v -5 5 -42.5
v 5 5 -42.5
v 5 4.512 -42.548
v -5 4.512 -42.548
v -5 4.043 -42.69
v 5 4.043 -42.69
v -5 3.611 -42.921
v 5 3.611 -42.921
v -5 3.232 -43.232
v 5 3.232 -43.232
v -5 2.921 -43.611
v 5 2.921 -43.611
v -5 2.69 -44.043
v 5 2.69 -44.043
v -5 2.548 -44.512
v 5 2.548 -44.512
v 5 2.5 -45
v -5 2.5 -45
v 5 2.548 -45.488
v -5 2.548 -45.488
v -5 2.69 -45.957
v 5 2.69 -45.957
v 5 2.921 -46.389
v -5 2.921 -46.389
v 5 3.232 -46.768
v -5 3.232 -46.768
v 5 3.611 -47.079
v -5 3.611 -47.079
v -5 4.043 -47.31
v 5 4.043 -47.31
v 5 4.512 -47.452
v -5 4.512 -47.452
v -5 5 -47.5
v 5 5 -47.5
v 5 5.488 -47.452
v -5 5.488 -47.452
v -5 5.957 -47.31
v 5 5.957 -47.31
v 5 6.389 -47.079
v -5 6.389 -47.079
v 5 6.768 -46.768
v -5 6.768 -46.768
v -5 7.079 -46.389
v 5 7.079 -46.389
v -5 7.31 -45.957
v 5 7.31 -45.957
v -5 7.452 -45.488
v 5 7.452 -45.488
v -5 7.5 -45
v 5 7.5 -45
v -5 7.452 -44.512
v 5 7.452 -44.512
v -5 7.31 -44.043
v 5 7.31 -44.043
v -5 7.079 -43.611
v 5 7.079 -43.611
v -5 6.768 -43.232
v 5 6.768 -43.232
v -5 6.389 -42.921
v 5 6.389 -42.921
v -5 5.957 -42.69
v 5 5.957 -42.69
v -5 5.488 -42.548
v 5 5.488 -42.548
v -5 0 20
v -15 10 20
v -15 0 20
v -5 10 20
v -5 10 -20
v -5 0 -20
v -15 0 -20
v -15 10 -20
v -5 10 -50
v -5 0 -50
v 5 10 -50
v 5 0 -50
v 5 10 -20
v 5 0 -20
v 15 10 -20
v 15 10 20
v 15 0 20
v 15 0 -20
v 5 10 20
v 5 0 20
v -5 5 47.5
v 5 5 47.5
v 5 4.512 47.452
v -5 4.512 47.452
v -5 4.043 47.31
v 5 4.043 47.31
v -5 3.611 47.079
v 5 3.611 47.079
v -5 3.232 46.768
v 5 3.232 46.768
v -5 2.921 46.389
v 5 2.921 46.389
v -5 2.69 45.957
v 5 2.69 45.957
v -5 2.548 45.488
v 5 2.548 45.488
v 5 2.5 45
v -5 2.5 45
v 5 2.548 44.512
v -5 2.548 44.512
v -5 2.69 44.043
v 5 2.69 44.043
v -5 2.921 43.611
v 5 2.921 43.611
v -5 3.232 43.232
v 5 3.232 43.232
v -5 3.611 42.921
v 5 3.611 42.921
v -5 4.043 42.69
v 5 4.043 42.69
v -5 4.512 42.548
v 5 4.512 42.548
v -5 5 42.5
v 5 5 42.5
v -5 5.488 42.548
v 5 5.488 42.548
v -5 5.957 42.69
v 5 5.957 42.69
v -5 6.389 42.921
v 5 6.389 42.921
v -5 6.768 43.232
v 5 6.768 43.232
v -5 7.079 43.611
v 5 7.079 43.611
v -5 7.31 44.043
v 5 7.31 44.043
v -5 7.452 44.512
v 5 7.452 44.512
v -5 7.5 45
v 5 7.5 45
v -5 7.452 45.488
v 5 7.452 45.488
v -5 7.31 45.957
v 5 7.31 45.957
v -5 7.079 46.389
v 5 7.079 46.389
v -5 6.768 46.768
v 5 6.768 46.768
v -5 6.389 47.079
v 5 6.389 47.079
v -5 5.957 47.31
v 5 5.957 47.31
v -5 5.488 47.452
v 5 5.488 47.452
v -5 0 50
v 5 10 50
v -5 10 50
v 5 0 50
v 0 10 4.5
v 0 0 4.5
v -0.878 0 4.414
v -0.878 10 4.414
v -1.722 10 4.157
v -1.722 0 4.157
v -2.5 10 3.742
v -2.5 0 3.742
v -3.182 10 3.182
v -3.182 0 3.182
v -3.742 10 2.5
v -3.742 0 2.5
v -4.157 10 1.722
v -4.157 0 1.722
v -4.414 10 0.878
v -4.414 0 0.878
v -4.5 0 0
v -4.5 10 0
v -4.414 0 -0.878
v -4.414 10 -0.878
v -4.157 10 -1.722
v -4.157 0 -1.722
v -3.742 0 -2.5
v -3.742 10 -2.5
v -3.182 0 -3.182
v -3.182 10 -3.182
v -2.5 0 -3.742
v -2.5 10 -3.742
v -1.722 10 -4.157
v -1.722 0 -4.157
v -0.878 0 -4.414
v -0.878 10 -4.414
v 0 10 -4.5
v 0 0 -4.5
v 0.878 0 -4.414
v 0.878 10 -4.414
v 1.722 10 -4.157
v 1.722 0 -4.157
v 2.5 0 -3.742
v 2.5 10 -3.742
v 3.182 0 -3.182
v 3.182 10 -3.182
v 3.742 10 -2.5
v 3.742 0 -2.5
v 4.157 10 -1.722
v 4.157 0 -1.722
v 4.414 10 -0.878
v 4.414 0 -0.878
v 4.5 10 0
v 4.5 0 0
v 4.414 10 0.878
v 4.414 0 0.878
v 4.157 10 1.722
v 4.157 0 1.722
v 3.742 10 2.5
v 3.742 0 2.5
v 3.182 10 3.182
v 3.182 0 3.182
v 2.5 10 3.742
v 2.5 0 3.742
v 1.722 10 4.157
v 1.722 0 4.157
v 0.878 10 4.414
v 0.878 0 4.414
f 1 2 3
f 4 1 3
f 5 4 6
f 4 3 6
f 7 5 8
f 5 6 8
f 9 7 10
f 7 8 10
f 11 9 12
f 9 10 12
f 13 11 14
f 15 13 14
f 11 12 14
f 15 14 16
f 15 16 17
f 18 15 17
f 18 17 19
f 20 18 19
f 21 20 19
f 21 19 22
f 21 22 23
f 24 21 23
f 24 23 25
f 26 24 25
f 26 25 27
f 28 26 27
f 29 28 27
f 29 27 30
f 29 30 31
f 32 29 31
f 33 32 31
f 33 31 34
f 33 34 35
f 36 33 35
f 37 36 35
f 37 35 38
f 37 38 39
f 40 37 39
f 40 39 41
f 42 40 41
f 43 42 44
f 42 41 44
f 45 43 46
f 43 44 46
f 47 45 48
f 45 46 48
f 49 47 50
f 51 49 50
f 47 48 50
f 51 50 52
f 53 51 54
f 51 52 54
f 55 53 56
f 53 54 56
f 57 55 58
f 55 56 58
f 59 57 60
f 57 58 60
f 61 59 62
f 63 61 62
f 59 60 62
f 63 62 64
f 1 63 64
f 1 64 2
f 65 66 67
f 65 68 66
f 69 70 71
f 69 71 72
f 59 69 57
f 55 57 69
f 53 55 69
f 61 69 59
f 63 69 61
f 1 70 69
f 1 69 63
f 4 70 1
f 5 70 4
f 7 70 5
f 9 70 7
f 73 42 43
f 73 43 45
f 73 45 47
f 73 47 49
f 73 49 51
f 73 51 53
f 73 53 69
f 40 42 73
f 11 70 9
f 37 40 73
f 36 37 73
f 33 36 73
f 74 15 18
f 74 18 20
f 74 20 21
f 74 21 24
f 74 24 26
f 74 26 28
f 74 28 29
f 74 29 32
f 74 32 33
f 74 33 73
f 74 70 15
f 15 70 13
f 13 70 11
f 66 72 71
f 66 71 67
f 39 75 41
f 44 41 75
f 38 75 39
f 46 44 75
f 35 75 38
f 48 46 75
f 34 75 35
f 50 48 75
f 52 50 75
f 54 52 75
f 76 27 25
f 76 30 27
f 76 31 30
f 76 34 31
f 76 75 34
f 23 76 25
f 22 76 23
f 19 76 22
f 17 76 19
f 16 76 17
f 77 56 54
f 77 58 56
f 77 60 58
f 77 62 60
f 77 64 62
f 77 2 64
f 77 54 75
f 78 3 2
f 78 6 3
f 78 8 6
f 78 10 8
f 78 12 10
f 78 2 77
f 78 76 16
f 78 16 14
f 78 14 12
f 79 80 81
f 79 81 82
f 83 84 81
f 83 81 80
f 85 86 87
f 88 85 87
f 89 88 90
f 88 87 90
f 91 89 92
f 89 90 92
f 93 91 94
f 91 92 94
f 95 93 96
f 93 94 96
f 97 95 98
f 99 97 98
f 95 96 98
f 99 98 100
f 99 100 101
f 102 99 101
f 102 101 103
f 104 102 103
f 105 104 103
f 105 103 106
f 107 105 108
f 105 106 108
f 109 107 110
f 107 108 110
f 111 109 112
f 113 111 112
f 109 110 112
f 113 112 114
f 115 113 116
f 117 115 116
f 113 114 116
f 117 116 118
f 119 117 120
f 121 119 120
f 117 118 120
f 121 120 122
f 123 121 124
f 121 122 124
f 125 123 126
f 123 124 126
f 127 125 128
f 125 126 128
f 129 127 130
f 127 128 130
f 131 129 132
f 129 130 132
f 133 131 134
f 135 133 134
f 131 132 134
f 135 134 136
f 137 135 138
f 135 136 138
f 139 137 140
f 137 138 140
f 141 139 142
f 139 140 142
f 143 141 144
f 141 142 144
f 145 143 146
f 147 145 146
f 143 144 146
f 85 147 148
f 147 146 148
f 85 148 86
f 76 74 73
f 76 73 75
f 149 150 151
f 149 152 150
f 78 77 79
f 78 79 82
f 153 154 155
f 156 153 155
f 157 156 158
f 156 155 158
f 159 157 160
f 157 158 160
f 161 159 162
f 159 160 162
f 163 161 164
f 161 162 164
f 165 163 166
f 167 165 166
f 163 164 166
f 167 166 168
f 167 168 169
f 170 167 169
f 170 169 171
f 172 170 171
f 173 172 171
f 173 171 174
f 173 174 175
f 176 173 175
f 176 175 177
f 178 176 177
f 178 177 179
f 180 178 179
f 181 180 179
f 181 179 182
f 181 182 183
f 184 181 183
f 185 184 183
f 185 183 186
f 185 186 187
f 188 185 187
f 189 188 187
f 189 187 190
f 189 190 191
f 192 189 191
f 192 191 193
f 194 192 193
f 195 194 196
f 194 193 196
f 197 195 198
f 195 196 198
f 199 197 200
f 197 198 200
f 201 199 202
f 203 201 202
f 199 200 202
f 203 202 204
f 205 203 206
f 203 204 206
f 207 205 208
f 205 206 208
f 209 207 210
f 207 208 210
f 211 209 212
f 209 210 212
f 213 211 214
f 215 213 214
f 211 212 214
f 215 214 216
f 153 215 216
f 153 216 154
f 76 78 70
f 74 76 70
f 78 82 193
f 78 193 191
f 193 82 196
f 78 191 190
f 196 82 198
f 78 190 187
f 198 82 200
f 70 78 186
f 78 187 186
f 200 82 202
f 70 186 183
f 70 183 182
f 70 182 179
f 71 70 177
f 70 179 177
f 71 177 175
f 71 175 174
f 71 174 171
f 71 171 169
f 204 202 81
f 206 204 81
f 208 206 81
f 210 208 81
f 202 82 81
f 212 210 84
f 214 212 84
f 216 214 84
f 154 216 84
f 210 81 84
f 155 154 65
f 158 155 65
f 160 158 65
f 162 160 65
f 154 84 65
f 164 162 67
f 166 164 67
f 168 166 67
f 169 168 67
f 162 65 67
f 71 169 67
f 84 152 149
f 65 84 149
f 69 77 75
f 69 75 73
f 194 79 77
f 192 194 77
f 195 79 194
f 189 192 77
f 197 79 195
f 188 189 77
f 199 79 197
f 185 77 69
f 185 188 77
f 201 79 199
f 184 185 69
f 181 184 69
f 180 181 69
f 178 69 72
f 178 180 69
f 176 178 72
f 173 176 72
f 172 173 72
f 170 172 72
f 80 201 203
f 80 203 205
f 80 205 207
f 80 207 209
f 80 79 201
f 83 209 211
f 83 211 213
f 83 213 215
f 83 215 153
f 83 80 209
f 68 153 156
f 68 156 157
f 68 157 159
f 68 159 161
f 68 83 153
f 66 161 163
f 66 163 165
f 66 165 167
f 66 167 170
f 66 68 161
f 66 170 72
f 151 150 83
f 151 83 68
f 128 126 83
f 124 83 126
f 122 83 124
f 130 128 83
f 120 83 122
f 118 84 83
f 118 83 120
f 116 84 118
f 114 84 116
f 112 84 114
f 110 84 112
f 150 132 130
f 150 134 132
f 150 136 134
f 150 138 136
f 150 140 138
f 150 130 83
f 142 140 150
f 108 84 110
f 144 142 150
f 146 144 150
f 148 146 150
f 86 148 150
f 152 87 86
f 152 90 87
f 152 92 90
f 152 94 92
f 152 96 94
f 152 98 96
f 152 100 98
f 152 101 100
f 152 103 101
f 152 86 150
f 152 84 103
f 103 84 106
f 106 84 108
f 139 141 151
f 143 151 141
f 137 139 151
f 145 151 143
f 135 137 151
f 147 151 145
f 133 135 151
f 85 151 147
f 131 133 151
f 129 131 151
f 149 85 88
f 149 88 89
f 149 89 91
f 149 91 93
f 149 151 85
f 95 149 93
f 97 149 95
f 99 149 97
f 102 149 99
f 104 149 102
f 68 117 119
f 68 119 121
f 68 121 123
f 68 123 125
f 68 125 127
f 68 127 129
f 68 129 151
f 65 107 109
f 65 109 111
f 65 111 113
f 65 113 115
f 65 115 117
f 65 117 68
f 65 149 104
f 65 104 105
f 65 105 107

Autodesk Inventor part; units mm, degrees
ref_plane "YZ Plane" through (0, 0, 0) normal (1, 0, 0) x (0, 1, 0)
ref_plane "XZ Plane" through (0, 0, 0) normal (0, 1, 0) x (-1, 0, 0)
ref_plane "XY Plane" through (0, 0, 0) normal (0, 0, 1) x (1, 0, 0)
sketch "Esquisse1" plane through (0, 0, 0) normal (0, 1, 0) x (-1, 0, 0)
  line L0 (-5, 50) -> (5, 50)
  line L1 (5, 50) -> (5, -50)
  line L2 (5, -50) -> (-5, -50)
  line L3 (-5, -50) -> (-5, 50)
  line L4 (-5, 50) -> (5, -50) construction
  line L5 (5, 50) -> (-5, -50) construction
  point P0 (0, 0)
  dimension "d0" = 10
  dimension "d1" = 100
extrude "Extrusion1" add sketch "Esquisse1" along normal blind 10
sketch "Esquisse2" plane through (-5, 0, -50) normal (-1, 0, 0) x (0, 0, 1)
  line L0 (0, 0) -> (100, 0) projected
  line L1 (100, 0) -> (100, 10) projected
  point P0 (50, 0)
  point P1 (5, 5)
  point P2 (95, 5)
hole "Perçage1" at (-5, 5, -45) at (-5, 5, 45) direction (1, 0, 0) diameter 5 end through all
sketch "Esquisse4" plane through (-5, 0, -50) normal (-1, 0, 0) x (0, 0, 1)
  line L0 (100, 10) -> (0, 10) projected
  line L1 (30, 10) -> (70, 10)
  line L2 (70, 10) -> (70, 0)
  line L3 (0, 0) -> (100, 0) projected
  line L4 (70, 0) -> (30, 0)
  line L5 (30, 0) -> (30, 10)
  point P0 (50, 0)
extrude "Extrusion2" add sketch "Esquisse4" along normal blind 10
mirror "Symétrie1" about plane through (0, 0, 0) normal (1, 0, 0) of "Extrusion2"
sketch "Esquisse5" plane through (0, 10, 0) normal (0, 1, 0) x (1, 0, 0)
  point P0 (0, 0)
  point P1 (0, 0)
hole "Perçage2" at (0, 10, 0) direction (0, -1, 0) diameter 9 end through all
ref_plane "Plan de construction1" through (0, 0, 0) normal (1, 0, 0) x (0, 1, 0)
properties part number "Support poulie"
